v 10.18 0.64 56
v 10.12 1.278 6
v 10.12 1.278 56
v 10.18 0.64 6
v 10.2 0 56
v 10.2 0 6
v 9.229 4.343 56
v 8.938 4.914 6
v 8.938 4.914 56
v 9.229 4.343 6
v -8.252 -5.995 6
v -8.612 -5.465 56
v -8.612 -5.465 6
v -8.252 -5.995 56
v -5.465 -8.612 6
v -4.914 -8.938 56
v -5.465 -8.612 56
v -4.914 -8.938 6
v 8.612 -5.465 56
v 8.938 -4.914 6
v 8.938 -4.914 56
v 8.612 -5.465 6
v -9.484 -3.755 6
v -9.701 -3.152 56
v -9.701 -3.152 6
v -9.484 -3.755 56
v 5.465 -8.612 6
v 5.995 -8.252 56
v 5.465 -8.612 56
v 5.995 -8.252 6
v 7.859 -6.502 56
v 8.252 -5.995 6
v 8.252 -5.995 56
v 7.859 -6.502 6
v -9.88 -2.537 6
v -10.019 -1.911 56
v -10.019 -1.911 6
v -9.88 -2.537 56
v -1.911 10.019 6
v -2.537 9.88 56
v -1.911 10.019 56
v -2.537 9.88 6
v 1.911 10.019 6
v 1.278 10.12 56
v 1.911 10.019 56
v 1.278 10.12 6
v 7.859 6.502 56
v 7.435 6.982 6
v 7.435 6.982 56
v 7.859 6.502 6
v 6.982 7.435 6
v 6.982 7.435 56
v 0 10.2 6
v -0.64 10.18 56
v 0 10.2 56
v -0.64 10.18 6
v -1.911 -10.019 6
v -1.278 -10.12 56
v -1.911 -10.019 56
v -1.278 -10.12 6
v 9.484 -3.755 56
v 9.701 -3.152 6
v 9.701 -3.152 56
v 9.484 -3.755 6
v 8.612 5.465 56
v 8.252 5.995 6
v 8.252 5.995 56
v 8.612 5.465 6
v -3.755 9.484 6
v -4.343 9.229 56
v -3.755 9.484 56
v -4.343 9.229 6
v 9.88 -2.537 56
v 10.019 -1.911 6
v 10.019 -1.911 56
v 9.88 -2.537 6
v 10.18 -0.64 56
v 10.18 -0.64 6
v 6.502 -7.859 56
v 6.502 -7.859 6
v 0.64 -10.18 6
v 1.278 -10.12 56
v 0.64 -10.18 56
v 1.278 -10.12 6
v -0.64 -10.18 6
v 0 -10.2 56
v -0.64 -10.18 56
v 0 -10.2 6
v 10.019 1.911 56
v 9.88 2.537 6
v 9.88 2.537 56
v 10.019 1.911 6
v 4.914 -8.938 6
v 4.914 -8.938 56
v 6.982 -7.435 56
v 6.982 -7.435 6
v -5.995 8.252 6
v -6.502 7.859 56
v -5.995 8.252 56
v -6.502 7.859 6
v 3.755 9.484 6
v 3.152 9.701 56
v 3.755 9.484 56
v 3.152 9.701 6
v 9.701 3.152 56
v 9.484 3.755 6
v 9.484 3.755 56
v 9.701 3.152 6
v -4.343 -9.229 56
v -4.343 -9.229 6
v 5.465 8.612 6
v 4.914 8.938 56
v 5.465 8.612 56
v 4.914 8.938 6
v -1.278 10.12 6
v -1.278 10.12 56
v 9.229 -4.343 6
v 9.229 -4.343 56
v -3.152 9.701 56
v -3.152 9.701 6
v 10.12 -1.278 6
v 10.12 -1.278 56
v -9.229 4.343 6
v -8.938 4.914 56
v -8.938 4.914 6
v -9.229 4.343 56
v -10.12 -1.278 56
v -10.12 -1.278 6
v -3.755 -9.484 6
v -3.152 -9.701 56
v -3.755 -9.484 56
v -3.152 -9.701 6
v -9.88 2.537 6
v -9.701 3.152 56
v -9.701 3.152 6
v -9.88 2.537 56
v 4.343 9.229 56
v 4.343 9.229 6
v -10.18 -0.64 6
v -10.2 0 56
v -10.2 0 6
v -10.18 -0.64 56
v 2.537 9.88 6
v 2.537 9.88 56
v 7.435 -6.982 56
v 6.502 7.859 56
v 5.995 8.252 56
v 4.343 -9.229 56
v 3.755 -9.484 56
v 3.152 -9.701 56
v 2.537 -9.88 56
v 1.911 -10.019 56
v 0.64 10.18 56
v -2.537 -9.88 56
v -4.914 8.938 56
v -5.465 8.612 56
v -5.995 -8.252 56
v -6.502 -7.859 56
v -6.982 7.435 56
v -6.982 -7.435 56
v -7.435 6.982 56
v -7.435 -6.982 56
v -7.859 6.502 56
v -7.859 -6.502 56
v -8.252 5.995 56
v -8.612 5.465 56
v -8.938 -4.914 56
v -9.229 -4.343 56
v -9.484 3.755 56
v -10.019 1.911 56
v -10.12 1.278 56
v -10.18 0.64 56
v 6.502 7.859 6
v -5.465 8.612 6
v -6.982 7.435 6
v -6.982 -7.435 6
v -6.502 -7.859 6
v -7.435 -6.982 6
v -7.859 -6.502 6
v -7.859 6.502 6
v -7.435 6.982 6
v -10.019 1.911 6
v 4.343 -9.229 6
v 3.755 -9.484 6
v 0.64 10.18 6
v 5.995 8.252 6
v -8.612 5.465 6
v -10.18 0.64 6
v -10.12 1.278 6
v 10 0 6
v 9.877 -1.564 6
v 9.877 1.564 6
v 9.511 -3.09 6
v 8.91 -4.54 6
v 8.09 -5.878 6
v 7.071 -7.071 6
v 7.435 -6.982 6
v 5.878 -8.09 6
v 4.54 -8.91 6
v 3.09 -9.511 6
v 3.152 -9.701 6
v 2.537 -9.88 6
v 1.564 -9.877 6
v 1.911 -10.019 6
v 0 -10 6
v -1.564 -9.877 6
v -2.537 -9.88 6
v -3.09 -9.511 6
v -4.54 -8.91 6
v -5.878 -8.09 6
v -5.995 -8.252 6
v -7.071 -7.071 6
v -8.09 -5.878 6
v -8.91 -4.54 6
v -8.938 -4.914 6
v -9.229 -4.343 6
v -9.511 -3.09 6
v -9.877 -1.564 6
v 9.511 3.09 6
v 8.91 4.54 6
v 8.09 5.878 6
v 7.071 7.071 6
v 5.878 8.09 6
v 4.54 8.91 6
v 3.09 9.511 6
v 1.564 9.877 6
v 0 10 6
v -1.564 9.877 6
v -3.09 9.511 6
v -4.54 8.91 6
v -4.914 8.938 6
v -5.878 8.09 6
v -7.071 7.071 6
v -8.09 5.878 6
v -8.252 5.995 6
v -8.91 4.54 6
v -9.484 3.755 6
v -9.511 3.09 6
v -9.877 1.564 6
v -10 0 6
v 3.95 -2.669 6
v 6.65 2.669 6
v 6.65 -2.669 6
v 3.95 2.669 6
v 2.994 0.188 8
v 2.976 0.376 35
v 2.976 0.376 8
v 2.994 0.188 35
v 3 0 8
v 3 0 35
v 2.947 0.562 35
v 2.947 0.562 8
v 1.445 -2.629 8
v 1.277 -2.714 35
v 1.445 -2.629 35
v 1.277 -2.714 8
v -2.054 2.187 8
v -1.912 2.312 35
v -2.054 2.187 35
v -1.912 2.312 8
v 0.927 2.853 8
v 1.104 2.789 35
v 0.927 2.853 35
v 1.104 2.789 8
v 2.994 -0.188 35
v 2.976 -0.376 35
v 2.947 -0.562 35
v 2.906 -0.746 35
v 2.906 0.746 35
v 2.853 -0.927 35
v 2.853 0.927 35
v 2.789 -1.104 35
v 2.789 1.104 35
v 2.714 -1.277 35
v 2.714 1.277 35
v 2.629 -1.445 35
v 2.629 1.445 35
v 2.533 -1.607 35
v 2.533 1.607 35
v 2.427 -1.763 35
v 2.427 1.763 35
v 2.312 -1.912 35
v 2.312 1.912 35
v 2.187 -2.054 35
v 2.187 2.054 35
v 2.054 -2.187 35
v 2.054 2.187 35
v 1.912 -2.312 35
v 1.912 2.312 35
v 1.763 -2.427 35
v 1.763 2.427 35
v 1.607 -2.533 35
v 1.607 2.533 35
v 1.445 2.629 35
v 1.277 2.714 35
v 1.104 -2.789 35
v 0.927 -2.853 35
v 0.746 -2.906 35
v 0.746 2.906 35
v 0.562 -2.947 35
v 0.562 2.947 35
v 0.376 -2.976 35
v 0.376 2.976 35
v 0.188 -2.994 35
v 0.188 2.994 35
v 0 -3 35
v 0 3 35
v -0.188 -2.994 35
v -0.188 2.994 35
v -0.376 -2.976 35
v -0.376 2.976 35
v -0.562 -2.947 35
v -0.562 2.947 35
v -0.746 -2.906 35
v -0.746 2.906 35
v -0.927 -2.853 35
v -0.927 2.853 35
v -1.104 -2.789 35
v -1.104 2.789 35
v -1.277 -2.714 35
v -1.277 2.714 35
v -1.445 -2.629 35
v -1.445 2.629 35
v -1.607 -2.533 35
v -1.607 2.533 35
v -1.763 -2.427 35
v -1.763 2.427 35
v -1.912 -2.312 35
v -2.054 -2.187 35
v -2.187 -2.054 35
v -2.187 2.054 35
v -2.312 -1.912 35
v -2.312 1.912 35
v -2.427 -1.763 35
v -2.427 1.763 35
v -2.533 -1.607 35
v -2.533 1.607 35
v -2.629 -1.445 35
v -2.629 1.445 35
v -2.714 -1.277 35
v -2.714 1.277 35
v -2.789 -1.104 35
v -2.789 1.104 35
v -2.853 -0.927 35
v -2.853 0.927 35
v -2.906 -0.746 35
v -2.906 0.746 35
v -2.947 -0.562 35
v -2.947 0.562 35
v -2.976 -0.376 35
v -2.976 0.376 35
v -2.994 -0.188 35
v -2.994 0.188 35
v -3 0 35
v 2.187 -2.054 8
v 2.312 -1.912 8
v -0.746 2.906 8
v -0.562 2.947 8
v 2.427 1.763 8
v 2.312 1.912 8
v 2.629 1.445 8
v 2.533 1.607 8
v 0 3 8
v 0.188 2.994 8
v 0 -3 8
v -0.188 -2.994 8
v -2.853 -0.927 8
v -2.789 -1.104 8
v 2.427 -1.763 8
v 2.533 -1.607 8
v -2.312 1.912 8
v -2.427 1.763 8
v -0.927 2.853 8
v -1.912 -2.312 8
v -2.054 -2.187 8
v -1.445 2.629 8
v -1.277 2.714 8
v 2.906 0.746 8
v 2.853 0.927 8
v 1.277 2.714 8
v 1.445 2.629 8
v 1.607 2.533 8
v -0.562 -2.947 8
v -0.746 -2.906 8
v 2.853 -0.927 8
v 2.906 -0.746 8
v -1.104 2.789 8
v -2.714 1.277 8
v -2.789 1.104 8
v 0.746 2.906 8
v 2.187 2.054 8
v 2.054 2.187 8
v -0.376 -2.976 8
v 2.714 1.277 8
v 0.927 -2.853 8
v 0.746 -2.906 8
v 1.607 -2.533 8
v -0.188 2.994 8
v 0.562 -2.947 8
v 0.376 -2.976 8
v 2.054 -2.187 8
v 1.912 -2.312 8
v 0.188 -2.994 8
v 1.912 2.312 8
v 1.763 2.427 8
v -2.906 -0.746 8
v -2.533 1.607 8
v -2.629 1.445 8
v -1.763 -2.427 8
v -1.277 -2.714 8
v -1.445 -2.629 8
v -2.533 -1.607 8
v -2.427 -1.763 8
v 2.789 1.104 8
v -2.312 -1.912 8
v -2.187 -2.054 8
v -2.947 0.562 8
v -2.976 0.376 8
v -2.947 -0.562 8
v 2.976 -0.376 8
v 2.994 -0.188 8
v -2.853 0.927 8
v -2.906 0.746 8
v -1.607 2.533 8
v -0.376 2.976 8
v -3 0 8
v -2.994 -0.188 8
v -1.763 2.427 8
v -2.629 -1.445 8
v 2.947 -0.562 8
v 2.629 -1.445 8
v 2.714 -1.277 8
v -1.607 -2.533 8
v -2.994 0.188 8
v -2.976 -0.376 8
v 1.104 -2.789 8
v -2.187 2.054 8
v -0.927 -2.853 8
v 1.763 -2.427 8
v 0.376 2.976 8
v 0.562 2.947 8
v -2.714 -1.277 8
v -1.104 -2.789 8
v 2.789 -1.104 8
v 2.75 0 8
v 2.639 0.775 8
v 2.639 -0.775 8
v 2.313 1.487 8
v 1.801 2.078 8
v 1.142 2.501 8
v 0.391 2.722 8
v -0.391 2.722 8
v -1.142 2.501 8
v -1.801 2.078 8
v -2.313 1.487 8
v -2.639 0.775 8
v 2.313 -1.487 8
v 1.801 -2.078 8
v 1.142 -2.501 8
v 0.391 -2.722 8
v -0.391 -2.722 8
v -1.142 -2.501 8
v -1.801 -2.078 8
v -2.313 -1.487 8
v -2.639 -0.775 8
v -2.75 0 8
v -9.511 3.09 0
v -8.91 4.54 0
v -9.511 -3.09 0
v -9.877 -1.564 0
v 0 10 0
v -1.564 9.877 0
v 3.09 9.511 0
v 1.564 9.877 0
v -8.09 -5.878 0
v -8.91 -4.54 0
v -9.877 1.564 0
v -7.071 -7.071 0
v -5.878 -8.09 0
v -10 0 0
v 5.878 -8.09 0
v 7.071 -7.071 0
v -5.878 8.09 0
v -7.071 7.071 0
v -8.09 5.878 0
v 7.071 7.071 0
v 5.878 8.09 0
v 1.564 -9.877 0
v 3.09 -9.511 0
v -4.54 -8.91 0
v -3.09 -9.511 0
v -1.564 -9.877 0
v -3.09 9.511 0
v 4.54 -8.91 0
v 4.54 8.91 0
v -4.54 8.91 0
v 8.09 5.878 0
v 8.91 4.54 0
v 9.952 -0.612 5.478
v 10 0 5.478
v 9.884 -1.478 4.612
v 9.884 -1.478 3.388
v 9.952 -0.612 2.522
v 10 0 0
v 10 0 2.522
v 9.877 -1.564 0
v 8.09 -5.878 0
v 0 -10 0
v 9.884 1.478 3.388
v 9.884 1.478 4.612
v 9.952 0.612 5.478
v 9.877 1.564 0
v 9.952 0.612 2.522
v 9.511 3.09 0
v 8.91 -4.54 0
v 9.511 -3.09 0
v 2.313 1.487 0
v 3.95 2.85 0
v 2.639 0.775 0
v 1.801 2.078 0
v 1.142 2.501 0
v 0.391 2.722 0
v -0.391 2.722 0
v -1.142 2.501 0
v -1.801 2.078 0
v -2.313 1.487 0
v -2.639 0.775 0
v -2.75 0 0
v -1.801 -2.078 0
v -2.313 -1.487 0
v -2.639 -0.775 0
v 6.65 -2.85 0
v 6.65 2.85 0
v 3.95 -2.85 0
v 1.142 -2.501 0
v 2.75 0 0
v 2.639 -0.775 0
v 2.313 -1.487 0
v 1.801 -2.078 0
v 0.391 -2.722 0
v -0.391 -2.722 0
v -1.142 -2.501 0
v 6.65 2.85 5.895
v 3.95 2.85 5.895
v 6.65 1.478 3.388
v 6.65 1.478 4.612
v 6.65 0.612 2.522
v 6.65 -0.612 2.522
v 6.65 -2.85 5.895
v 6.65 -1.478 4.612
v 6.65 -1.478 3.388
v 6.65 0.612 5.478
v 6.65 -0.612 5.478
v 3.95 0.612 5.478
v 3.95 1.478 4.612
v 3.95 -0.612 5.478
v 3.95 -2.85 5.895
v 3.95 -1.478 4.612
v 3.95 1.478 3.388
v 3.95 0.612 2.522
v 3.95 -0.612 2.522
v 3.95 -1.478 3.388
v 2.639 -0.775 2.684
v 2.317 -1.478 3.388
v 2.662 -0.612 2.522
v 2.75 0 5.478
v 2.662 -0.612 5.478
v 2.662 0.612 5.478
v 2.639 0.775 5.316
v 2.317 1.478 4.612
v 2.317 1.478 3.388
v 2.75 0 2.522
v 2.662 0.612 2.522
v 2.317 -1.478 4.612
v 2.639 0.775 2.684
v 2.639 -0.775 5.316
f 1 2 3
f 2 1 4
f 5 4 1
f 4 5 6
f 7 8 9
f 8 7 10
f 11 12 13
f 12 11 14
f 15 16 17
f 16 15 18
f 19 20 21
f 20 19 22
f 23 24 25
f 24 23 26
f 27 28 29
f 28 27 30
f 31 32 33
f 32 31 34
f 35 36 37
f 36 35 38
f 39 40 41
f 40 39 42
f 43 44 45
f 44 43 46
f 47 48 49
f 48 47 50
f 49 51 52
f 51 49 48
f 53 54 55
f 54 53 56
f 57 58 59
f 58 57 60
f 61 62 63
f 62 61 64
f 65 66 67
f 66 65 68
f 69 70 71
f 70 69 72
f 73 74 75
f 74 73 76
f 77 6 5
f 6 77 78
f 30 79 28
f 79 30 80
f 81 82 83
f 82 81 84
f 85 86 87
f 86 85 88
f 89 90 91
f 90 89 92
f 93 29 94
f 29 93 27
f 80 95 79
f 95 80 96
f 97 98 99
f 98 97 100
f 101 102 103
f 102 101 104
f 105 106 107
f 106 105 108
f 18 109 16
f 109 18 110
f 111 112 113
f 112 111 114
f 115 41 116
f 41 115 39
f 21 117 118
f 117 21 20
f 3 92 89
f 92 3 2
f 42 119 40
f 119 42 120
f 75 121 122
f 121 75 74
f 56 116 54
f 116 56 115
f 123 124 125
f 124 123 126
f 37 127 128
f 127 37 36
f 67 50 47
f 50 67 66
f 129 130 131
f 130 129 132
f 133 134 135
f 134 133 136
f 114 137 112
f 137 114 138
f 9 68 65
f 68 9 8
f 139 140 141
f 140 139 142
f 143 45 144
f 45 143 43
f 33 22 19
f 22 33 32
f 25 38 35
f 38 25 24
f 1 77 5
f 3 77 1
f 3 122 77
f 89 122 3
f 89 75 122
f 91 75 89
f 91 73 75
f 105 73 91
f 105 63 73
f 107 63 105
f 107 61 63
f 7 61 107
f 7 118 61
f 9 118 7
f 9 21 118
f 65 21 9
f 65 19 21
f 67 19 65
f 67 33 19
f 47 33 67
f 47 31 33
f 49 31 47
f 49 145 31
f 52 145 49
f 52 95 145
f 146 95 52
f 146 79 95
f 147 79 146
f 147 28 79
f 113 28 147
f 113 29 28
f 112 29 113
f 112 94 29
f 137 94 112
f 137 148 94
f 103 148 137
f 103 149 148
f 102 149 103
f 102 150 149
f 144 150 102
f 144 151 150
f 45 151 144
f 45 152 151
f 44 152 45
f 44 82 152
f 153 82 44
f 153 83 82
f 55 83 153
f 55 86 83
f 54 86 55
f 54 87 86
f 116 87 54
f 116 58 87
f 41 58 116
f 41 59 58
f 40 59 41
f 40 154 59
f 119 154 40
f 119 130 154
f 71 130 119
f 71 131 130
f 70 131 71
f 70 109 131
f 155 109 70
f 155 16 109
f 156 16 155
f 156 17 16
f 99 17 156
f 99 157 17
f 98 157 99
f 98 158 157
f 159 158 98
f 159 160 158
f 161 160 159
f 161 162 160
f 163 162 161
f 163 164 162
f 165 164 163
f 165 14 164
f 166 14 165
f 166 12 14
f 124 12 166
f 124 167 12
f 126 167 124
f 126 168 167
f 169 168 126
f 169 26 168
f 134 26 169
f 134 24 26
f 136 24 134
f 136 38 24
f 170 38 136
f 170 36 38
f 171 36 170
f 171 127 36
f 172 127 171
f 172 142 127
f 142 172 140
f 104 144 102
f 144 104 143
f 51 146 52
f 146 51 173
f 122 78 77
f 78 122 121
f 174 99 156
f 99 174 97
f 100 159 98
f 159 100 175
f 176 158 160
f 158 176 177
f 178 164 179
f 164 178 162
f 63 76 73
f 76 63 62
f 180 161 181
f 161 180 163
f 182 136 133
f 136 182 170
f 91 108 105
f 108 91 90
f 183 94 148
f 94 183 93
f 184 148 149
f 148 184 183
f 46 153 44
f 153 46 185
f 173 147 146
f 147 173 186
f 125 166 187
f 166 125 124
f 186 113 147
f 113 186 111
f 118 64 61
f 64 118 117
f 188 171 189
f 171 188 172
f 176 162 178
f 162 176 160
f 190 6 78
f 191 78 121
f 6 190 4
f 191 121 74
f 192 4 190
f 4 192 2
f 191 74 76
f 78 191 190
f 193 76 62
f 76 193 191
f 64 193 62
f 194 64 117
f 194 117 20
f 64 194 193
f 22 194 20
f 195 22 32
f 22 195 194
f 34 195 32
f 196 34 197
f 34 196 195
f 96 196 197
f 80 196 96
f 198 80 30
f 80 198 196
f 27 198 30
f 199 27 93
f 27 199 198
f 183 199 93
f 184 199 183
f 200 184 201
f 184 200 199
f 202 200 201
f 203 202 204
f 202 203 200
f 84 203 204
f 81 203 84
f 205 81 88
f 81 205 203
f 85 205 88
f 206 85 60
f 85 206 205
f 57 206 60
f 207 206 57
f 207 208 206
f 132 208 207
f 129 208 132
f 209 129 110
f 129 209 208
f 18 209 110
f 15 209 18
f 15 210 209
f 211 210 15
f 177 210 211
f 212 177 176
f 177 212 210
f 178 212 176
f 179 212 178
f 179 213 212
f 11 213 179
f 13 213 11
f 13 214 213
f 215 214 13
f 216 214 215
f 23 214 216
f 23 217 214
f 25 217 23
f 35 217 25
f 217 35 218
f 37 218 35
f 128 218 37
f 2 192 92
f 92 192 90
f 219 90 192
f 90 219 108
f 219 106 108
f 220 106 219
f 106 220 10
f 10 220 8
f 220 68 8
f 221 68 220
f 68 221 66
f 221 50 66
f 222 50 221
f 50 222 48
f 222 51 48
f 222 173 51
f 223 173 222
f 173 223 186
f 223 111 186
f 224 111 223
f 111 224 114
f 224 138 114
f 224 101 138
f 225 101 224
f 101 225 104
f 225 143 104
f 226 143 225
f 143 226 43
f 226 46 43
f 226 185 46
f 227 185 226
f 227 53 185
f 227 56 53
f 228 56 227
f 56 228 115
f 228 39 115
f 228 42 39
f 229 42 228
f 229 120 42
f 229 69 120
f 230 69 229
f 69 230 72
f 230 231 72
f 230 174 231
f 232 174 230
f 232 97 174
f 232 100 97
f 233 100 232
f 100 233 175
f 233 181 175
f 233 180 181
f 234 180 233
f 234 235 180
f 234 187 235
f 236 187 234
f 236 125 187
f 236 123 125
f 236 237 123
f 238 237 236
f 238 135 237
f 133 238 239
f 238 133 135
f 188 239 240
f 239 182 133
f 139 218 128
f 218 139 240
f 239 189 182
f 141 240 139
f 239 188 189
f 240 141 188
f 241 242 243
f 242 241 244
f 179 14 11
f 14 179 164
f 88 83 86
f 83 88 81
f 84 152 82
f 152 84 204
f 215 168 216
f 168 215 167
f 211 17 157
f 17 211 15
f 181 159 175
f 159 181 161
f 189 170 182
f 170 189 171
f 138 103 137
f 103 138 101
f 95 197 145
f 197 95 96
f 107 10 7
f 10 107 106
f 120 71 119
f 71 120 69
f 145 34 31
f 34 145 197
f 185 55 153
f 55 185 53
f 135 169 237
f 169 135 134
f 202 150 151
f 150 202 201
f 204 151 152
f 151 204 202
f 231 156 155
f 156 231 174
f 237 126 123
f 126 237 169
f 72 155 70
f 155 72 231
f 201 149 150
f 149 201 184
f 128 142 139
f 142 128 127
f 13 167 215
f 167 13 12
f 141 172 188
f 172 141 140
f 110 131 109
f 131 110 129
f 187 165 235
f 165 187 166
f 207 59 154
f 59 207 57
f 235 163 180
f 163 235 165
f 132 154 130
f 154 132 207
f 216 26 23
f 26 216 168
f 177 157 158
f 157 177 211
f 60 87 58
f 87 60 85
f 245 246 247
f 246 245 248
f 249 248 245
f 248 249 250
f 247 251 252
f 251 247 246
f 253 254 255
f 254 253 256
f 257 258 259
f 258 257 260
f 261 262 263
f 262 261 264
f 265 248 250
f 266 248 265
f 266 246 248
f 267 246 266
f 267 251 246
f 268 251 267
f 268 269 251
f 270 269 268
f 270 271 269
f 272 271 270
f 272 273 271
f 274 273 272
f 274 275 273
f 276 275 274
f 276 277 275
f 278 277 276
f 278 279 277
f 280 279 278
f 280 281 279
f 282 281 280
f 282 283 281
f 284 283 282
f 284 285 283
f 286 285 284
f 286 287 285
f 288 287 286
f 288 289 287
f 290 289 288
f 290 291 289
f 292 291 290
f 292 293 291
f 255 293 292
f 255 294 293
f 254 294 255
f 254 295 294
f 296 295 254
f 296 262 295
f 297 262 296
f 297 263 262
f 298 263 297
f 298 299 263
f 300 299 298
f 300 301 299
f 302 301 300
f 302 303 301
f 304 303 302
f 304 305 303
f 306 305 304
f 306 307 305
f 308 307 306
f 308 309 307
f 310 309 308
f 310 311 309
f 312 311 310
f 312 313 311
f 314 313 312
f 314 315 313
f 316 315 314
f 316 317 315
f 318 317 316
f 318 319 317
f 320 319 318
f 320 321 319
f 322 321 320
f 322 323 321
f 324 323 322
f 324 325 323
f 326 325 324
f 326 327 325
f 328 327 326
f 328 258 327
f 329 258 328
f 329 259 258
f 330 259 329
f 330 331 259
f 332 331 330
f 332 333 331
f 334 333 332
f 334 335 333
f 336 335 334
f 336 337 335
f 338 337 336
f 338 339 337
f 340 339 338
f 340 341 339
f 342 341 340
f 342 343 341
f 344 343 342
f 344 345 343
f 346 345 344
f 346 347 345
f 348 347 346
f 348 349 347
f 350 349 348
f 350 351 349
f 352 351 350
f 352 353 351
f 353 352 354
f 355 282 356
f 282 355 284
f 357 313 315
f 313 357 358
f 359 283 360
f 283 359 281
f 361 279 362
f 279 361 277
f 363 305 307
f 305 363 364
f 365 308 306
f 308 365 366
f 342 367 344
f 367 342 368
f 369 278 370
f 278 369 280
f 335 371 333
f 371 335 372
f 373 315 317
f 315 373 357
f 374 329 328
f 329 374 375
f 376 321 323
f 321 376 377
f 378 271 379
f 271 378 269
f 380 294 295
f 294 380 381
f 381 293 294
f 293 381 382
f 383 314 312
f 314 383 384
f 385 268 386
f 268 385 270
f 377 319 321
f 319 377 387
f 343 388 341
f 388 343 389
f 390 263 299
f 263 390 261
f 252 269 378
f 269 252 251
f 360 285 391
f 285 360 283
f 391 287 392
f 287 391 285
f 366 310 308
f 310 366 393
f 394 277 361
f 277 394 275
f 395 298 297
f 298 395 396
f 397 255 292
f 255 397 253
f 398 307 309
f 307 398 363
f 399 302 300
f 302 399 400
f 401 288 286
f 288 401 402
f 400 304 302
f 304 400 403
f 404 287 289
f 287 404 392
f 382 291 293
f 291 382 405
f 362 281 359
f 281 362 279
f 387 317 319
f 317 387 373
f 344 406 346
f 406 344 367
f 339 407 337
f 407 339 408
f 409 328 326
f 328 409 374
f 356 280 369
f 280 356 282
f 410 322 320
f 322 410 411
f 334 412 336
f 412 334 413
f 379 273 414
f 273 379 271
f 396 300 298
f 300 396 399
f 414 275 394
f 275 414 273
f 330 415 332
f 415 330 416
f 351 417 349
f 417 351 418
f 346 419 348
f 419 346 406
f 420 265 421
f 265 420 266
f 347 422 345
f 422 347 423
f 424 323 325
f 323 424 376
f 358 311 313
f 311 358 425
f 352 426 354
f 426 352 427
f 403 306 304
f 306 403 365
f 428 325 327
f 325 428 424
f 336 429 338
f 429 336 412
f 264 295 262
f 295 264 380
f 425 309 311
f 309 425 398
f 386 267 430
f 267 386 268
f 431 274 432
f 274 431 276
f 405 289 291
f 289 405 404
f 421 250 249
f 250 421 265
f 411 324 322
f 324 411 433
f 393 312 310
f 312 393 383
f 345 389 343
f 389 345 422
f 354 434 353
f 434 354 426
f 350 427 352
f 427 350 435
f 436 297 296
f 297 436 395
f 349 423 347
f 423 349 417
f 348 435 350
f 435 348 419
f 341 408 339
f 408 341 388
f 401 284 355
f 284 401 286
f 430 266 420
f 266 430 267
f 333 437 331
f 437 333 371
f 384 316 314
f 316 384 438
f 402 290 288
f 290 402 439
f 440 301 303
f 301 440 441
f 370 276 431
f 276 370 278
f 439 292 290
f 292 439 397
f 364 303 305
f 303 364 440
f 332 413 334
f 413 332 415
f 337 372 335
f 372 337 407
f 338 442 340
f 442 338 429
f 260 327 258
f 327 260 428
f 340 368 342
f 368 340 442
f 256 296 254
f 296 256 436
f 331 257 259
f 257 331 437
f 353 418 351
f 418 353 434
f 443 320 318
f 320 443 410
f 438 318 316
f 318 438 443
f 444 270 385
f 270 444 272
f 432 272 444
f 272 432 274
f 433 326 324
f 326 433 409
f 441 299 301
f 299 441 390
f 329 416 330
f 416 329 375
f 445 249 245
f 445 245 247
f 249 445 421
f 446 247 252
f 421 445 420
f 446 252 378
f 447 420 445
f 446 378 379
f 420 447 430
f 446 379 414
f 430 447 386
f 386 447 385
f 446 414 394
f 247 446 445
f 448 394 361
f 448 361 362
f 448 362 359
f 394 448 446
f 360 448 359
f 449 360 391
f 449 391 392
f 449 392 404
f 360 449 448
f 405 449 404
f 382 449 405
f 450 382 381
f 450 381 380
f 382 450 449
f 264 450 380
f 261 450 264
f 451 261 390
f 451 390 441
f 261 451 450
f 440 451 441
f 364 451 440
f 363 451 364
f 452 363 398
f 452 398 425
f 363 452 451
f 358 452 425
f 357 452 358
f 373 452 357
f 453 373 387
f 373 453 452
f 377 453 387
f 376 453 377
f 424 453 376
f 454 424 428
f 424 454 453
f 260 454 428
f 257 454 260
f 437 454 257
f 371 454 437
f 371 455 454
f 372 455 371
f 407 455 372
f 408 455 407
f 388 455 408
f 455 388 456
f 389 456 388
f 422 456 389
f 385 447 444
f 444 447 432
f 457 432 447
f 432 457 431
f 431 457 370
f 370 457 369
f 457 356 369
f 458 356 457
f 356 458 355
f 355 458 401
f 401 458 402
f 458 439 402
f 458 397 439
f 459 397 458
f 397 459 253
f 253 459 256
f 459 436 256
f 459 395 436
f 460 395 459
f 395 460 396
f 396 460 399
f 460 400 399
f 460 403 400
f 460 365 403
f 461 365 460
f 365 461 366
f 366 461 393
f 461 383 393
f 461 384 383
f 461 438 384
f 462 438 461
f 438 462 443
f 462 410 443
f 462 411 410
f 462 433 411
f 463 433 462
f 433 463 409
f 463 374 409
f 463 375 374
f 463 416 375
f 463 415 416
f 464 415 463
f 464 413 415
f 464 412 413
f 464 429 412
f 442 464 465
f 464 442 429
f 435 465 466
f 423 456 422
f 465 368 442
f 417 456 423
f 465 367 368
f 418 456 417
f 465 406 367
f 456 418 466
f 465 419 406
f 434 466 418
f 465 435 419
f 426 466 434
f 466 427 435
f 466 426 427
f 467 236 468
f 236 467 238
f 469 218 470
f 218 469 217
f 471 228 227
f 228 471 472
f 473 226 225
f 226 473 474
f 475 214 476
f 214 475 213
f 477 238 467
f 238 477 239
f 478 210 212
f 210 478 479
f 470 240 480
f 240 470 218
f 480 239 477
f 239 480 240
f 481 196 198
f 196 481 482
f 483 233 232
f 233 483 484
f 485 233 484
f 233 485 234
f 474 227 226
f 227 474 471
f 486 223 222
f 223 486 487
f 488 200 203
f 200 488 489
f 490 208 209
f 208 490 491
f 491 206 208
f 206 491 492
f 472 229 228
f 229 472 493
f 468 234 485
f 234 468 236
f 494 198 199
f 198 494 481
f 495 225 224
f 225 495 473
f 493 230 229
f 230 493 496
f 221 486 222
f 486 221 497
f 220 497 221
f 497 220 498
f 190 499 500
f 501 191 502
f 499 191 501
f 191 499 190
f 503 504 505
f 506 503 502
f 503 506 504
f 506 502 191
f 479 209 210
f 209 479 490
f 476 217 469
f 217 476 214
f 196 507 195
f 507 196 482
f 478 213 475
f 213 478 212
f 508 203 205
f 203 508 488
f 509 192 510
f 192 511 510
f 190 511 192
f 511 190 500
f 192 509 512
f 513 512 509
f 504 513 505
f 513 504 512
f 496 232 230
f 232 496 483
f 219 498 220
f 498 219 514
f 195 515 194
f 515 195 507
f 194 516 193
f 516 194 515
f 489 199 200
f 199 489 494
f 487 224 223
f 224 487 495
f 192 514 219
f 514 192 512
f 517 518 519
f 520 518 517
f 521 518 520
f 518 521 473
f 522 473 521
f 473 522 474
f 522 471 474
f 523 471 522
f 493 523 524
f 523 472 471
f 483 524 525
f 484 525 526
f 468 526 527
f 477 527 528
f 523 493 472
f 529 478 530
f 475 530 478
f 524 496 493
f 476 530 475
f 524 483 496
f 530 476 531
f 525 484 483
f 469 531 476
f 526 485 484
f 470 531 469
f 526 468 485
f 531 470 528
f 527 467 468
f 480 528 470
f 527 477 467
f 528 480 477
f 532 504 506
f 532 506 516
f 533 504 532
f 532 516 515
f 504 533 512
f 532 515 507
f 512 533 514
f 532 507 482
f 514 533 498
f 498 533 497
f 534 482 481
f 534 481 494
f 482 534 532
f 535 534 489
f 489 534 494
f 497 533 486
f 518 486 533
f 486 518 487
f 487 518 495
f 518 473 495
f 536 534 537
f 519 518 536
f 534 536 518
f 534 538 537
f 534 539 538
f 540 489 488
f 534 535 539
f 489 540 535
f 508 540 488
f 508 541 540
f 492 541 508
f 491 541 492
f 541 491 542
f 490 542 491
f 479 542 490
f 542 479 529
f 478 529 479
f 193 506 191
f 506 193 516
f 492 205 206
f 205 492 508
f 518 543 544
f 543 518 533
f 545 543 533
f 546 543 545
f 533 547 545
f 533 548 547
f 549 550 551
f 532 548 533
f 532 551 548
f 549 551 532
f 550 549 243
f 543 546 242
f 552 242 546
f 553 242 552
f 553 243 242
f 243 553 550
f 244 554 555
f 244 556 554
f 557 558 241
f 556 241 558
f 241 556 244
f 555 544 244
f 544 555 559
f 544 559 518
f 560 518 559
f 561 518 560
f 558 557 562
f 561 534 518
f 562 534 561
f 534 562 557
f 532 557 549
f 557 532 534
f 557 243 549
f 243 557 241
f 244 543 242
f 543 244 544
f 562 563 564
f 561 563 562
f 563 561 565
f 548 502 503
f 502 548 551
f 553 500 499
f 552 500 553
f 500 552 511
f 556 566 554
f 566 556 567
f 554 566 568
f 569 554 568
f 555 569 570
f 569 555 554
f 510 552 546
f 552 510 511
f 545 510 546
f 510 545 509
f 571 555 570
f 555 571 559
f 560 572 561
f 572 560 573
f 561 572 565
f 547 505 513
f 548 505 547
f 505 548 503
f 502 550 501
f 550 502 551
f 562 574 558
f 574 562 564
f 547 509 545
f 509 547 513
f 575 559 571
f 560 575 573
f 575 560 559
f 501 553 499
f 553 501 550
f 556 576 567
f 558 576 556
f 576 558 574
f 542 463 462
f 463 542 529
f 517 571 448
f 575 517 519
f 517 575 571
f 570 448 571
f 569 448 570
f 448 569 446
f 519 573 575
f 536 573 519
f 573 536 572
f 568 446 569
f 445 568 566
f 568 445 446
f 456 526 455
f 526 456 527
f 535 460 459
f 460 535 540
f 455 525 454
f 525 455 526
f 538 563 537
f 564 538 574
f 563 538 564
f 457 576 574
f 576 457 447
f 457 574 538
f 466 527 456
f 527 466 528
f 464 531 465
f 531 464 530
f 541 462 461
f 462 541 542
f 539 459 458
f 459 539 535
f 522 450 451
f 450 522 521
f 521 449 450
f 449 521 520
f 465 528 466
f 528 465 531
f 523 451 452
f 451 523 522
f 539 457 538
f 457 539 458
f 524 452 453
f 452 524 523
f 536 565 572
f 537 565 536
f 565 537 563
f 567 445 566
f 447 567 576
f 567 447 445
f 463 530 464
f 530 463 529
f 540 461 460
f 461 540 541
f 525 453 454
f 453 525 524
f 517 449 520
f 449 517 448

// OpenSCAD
// Parametric Pulley with multiple belt profiles
// by droftarts January 2012

// Based on pulleys by:
// http://www.thingiverse.com/thing:11256 by me!
// https://github.com/prusajr/PrusaMendel by Josef Prusa
// http://www.thingiverse.com/thing:3104 by GilesBathgate
// http://www.thingiverse.com/thing:2079 by nophead

// dxf tooth data from http://oem.cadregister.com/asp/PPOW_Entry.asp?company=915217&elementID=07807803/METRIC/URETH/WV0025/F
// pulley diameter checked and modelled from data at http://www.sdp-si.com/D265/HTML/D265T016.html

/**
 * @name Pulley
 * @category Printed
 * @using 1 x m3 nut, normal or nyloc
 * @using 1 x m3x10 set screw or 1 x m3x8 grub screw
 */


// tuneable constants

teeth = 8;			// Number of teeth, standard Mendel T5 belt = 8, gives Outside Diameter of 11.88mm
profile = 1;		// 1=MXL 2=40DP 3=XL 4=H 5=T2.5 6=T5 7=T10 8=AT5 9=HTD_3mm 10=HTD_5mm 11=HTD_8mm 12=GT2_2mm 13=GT2_3mm 14=GT2_5mm

motor_shaft = 5.5;	// NEMA17 motor shaft exact diameter = 5
m3_dia = 3.2;		// 3mm hole diameter
m3_nut_hex = 1;		// 1 for hex, 0 for square nut
m3_nut_flats = 5.7;	// normal M3 hex nut exact width = 5.5
m3_nut_depth = 2.7;	// normal M3 hex nut exact depth = 2.4, nyloc = 4

retainer = 0;		// Belt retainer above teeth, 0 = No, 1 = Yes
retainer_ht = 1.5;	// height of retainer flange over pulley, standard = 1.5
idler = 0;			// Belt retainer below teeth, 0 = No, 1 = Yes
idler_ht = 1.5;		// height of idler flange over pulley, standard = 1.5

pulley_t_ht = 12;	// length of toothed part of pulley, standard = 12
pulley_b_ht = 8;		// pulley base height, standard = 8. Set to same as idler_ht if you want an idler but no pulley.
pulley_b_dia = 20;	// pulley base diameter, standard = 20
no_of_nuts = 1;		// number of captive nuts required, standard = 1
nut_angle = 90;		// angle between nuts, standard = 90
nut_shaft_distance = 1.2;	// distance between inner face of nut and shaft, can be negative.


//	********************************
//	** Scaling tooth for good fit **
//	********************************
/*	To improve fit of belt to pulley, set the following constant. Decrease or increase by 0.1mm at a time. We are modelling the *BELT* tooth here, not the tooth on the pulley. Increasing the number will *decrease* the pulley tooth size. Increasing the tooth width will also scale proportionately the tooth depth, to maintain the shape of the tooth, and increase how far into the pulley the tooth is indented. Can be negative */

additional_tooth_width = 0.2; //mm

//	If you need more tooth depth than this provides, adjust the following constant. However, this will cause the shape of the tooth to change.

additional_tooth_depth = 0; //mm

// calculated constants

nut_elevation = pulley_b_ht/2;
m3_nut_points = 2*((m3_nut_flats/2)/cos(30)); // This is needed for the nut trap

// The following set the pulley diameter for a given number of teeth

MXL_pulley_dia = tooth_spacing (2.032,0.254);
40DP_pulley_dia = tooth_spacing (2.07264,0.1778);
XL_pulley_dia = tooth_spacing (5.08,0.254);
H_pulley_dia = tooth_spacing (9.525,0.381);
T2_5_pulley_dia = tooth_spaceing_curvefit (0.7467,0.796,1.026);
T5_pulley_dia = tooth_spaceing_curvefit (0.6523,1.591,1.064);
T10_pulley_dia = tooth_spacing (10,0.93);
AT5_pulley_dia = tooth_spaceing_curvefit (0.6523,1.591,1.064);
HTD_3mm_pulley_dia = tooth_spacing (3,0.381);
HTD_5mm_pulley_dia = tooth_spacing (5,0.5715);
HTD_8mm_pulley_dia = tooth_spacing (8,0.6858);
GT2_2mm_pulley_dia = tooth_spacing (2,0.254);
GT2_3mm_pulley_dia = tooth_spacing (3,0.381);
GT2_5mm_pulley_dia = tooth_spacing (5,0.5715);

// The following calls the pulley creation part, and passes the pulley diameter and tooth width to that module

if ( profile == 1 ) { pulley ( "MXL" , MXL_pulley_dia , 0.508 , 1.321 ); }
if ( profile == 2 ) { pulley ( "40 D.P." , 40DP_pulley_dia , 0.457 , 1.226 ); }
if ( profile == 3 ) { pulley ( "XL" , XL_pulley_dia , 1.27, 3.051 ); }
if ( profile == 4 ) { pulley ( "H" , H_pulley_dia ,1.905 , 5.359 ); }
if ( profile == 5 ) { pulley ( "T2.5" , T2_5_pulley_dia , 0.7 , 1.678 ); }
if ( profile == 6 ) { pulley ( "T5" , T5_pulley_dia , 1.19 , 3.264 ); }
if ( profile == 7 ) { pulley ( "T10" , T10_pulley_dia , 2.5 , 6.13 ); }
if ( profile == 8 ) { pulley ( "AT5" , AT5_pulley_dia , 1.19 , 4.268 ); }
if ( profile == 9 ) { pulley ( "HTD 3mm" , HTD_3mm_pulley_dia , 1.289 , 2.27 ); }
if ( profile == 10 ) { pulley ( "HTD 5mm" , HTD_5mm_pulley_dia , 2.199 , 3.781 ); }
if ( profile == 11 ) { pulley ( "HTD 8mm" , HTD_8mm_pulley_dia , 3.607 , 6.603 ); }
if ( profile == 12 ) { pulley ( "GT2 2mm" , GT2_2mm_pulley_dia , 0.764 , 1.494 ); }
if ( profile == 13 ) { pulley ( "GT2 3mm" , GT2_3mm_pulley_dia , 1.169 , 2.31 ); }
if ( profile == 14 ) { pulley ( "GT2 5mm" , GT2_5mm_pulley_dia , 1.969 , 3.952 ); }

// Functions

function tooth_spaceing_curvefit (b,c,d)
	= ((c * pow(teeth,d)) / (b + pow(teeth,d))) * teeth ;

function tooth_spacing(tooth_pitch,pitch_line_offset)
	= (2*((teeth*tooth_pitch)/(3.14159265*2)-pitch_line_offset)) ;

// Main Module

$fn = 100;

module pulley( belt_type , pulley_OD , tooth_depth , tooth_width )
	{
	echo (str("Belt type = ",belt_type,"; Number of teeth = ",teeth,"; Pulley Outside Diameter = ",pulley_OD,"mm "));
	tooth_distance_from_centre = sqrt( pow(pulley_OD/2,2) - pow((tooth_width+additional_tooth_width)/2,2));
	tooth_width_scale = (tooth_width + additional_tooth_width ) / tooth_width;
	tooth_depth_scale = ((tooth_depth + additional_tooth_depth ) / tooth_depth) ;


//	************************************************************************
//	*** uncomment the following line if pulley is wider than puller base ***
//	************************************************************************

//	translate ([0,0, pulley_b_ht + pulley_t_ht + retainer_ht ]) rotate ([0,180,0])
    
        difference() {
    translate([0, 0, 31])    
    cylinder(h = 50, r=10.2, center = true);
            
                translate([0, 0, 15])    
    cylinder(h = 40, r=3, center = true);
        }

	difference()
	 {	 
		union()
		{
			//base
	
			if ( pulley_b_ht < 2 ) { echo ("CAN'T DRAW PULLEY BASE, HEIGHT LESS THAN 2!!!"); } else {
				rotate_extrude($fn=pulley_b_dia*2)
				{
						square([pulley_b_dia/2-1,pulley_b_ht]);
						square([pulley_b_dia/2,pulley_b_ht-1]);
						translate([pulley_b_dia/2-1,pulley_b_ht-1]) circle(1);
				}
			}
            
	
		difference()
			{
			//shaft - diameter is outside diameter of pulley
			
			translate([0,0,pulley_b_ht]) 
			rotate ([0,0,360/(teeth*4)]) 
			cylinder(r=pulley_OD/2,h=pulley_t_ht, $fn=teeth*4);
	
			//teeth - cut out of shaft
		
			for(i=[1:teeth]) 
			rotate([0,0,i*(360/teeth)])
			translate([0,-tooth_distance_from_centre,pulley_b_ht -1]) 
			scale ([ tooth_width_scale , tooth_depth_scale , 1 ]) 
			{
			if ( profile == 1 ) { MXL();}
			if ( profile == 2 ) { 40DP();}
			if ( profile == 3 ) { XL();}
			if ( profile == 4 ) { H();}
			if ( profile == 5 ) { T2_5();}
			if ( profile == 6 ) { T5();}
			if ( profile == 7 ) { T10();}
			if ( profile == 8 ) { AT5();}
			if ( profile == 9 ) { HTD_3mm();}
			if ( profile == 10 ) { HTD_5mm();}
			if ( profile == 11 ) { HTD_8mm();}
			if ( profile == 12 ) { GT2_2mm();}
			if ( profile == 13 ) { GT2_3mm();}
			if ( profile == 14 ) { GT2_5mm();}
			}

			}
			
		//belt retainer / idler
		if ( retainer > 0 ) {translate ([0,0, pulley_b_ht + pulley_t_ht ]) 
		rotate_extrude($fn=teeth*4)  
		polygon([[0,0],[pulley_OD/2,0],[pulley_OD/2 + retainer_ht , retainer_ht],[0 , retainer_ht],[0,0]]);}
		
		if ( idler > 0 ) {translate ([0,0, pulley_b_ht - idler_ht ]) 
		rotate_extrude($fn=teeth*4)  
		polygon([[0,0],[pulley_OD/2 + idler_ht,0],[pulley_OD/2 , idler_ht],[0 , idler_ht],[0,0]]);}
	
		}
	   
		//hole for motor shaft
		translate([0,0,-1])cylinder(r=motor_shaft/2,h=pulley_b_ht + pulley_t_ht + retainer_ht + 2,$fn=motor_shaft*4);
				
		//captive nut and grub screw holes
	
		if ( pulley_b_ht < m3_nut_flats ) { echo ("CAN'T DRAW CAPTIVE NUTS, HEIGHT LESS THAN NUT DIAMETER!!!"); } else {
		if ( (pulley_b_dia - motor_shaft)/2 < m3_nut_depth + 3 ) { echo ("CAN'T DRAW CAPTIVE NUTS, DIAMETER TOO SMALL FOR NUT DEPTH!!!"); } else {
	
			for(j=[1:no_of_nuts]) rotate([0,0,j*nut_angle])
			translate([0,0,nut_elevation])rotate([90,0,0])
	
			union()
			{
				//entrance
				translate([0,-pulley_b_ht/4-0.5,motor_shaft/2+m3_nut_depth/2+nut_shaft_distance]) cube([m3_nut_flats,pulley_b_ht/2+1,m3_nut_depth],center=true);
	
				//nut
				if ( m3_nut_hex > 0 )
					{
						// hex nut
						translate([0,0.25,motor_shaft/2+m3_nut_depth/2+nut_shaft_distance]) rotate([0,0,30]) cylinder(r=m3_nut_points/2,h=m3_nut_depth,center=true,$fn=6);
					} else {
						// square nut
						translate([0,0.25,motor_shaft/2+m3_nut_depth/2+nut_shaft_distance]) cube([m3_nut_flats,m3_nut_flats,m3_nut_depth],center=true);
					}
	
				//grub screw hole
				rotate([0,0,22.5])cylinder(r=m3_dia/2,h=pulley_b_dia/2+1,$fn=8);
			}
		}}
	 }
	   
	}


// Tooth profile modules

module MXL()
	{
	linear_extrude(height=pulley_t_ht+2) polygon([[-0.660421,-0.5],[-0.660421,0],[-0.621898,0.006033],[-0.587714,0.023037],[-0.560056,0.049424],[-0.541182,0.083609],[-0.417357,0.424392],[-0.398413,0.458752],[-0.370649,0.48514],[-0.336324,0.502074],[-0.297744,0.508035],[0.297744,0.508035],[0.336268,0.502074],[0.370452,0.48514],[0.39811,0.458752],[0.416983,0.424392],[0.540808,0.083609],[0.559752,0.049424],[0.587516,0.023037],[0.621841,0.006033],[0.660421,0],[0.660421,-0.5]]);
	}

module 40DP()
	{
	linear_extrude(height=pulley_t_ht+2) polygon([[-0.612775,-0.5],[-0.612775,0],[-0.574719,0.010187],[-0.546453,0.0381],[-0.355953,0.3683],[-0.327604,0.405408],[-0.291086,0.433388],[-0.248548,0.451049],[-0.202142,0.4572],[0.202494,0.4572],[0.248653,0.451049],[0.291042,0.433388],[0.327609,0.405408],[0.356306,0.3683],[0.546806,0.0381],[0.574499,0.010187],[0.612775,0],[0.612775,-0.5]]);
	}

module XL()
	{
	linear_extrude(height=pulley_t_ht+2) polygon([[-1.525411,-1],[-1.525411,0],[-1.41777,0.015495],[-1.320712,0.059664],[-1.239661,0.129034],[-1.180042,0.220133],[-0.793044,1.050219],[-0.733574,1.141021],[-0.652507,1.210425],[-0.555366,1.254759],[-0.447675,1.270353],[0.447675,1.270353],[0.555366,1.254759],[0.652507,1.210425],[0.733574,1.141021],[0.793044,1.050219],[1.180042,0.220133],[1.239711,0.129034],[1.320844,0.059664],[1.417919,0.015495],[1.525411,0],[1.525411,-1]]);
	}

module H()
	{
	linear_extrude(height=pulley_t_ht+2) polygon([[-2.6797,-1],[-2.6797,0],[-2.600907,0.006138],[-2.525342,0.024024],[-2.45412,0.052881],[-2.388351,0.091909],[-2.329145,0.140328],[-2.277614,0.197358],[-2.234875,0.262205],[-2.202032,0.334091],[-1.75224,1.57093],[-1.719538,1.642815],[-1.676883,1.707663],[-1.62542,1.764693],[-1.566256,1.813112],[-1.500512,1.85214],[-1.4293,1.880997],[-1.353742,1.898883],[-1.274949,1.905021],[1.275281,1.905021],[1.354056,1.898883],[1.429576,1.880997],[1.500731,1.85214],[1.566411,1.813112],[1.625508,1.764693],[1.676919,1.707663],[1.719531,1.642815],[1.752233,1.57093],[2.20273,0.334091],[2.235433,0.262205],[2.278045,0.197358],[2.329455,0.140328],[2.388553,0.091909],[2.454233,0.052881],[2.525384,0.024024],[2.600904,0.006138],[2.6797,0],[2.6797,-1]]);
	}

module T2_5()
	{
	linear_extrude(height=pulley_t_ht+2) polygon([[-0.839258,-0.5],[-0.839258,0],[-0.770246,0.021652],[-0.726369,0.079022],[-0.529167,0.620889],[-0.485025,0.67826],[-0.416278,0.699911],[0.416278,0.699911],[0.484849,0.67826],[0.528814,0.620889],[0.726369,0.079022],[0.770114,0.021652],[0.839258,0],[0.839258,-0.5]]);
	}

module T5()
	{
	linear_extrude(height=pulley_t_ht+2) polygon([[-1.632126,-0.5],[-1.632126,0],[-1.568549,0.004939],[-1.507539,0.019367],[-1.450023,0.042686],[-1.396912,0.074224],[-1.349125,0.113379],[-1.307581,0.159508],[-1.273186,0.211991],[-1.246868,0.270192],[-1.009802,0.920362],[-0.983414,0.978433],[-0.949018,1.030788],[-0.907524,1.076798],[-0.859829,1.115847],[-0.80682,1.147314],[-0.749402,1.170562],[-0.688471,1.184956],[-0.624921,1.189895],[0.624971,1.189895],[0.688622,1.184956],[0.749607,1.170562],[0.807043,1.147314],[0.860055,1.115847],[0.907754,1.076798],[0.949269,1.030788],[0.9837,0.978433],[1.010193,0.920362],[1.246907,0.270192],[1.273295,0.211991],[1.307726,0.159508],[1.349276,0.113379],[1.397039,0.074224],[1.450111,0.042686],[1.507589,0.019367],[1.568563,0.004939],[1.632126,0],[1.632126,-0.5]]);
	}

module T10()
	{
	linear_extrude(height=pulley_t_ht+2) polygon([[-3.06511,-1],[-3.06511,0],[-2.971998,0.007239],[-2.882718,0.028344],[-2.79859,0.062396],[-2.720931,0.108479],[-2.651061,0.165675],[-2.590298,0.233065],[-2.539962,0.309732],[-2.501371,0.394759],[-1.879071,2.105025],[-1.840363,2.190052],[-1.789939,2.266719],[-1.729114,2.334109],[-1.659202,2.391304],[-1.581518,2.437387],[-1.497376,2.47144],[-1.408092,2.492545],[-1.314979,2.499784],[1.314979,2.499784],[1.408091,2.492545],[1.497371,2.47144],[1.581499,2.437387],[1.659158,2.391304],[1.729028,2.334109],[1.789791,2.266719],[1.840127,2.190052],[1.878718,2.105025],[2.501018,0.394759],[2.539726,0.309732],[2.59015,0.233065],[2.650975,0.165675],[2.720887,0.108479],[2.798571,0.062396],[2.882713,0.028344],[2.971997,0.007239],[3.06511,0],[3.06511,-1]]);
	}

module AT5()
	{
	linear_extrude(height=pulley_t_ht+2) polygon([[-2.134129,-0.75],[-2.134129,0],[-2.058023,0.005488],[-1.984595,0.021547],[-1.914806,0.047569],[-1.849614,0.082947],[-1.789978,0.127073],[-1.736857,0.179338],[-1.691211,0.239136],[-1.653999,0.305859],[-1.349199,0.959203],[-1.286933,1.054635],[-1.201914,1.127346],[-1.099961,1.173664],[-0.986896,1.18992],[0.986543,1.18992],[1.099614,1.173664],[1.201605,1.127346],[1.286729,1.054635],[1.349199,0.959203],[1.653646,0.305859],[1.690859,0.239136],[1.73651,0.179338],[1.789644,0.127073],[1.849305,0.082947],[1.914539,0.047569],[1.984392,0.021547],[2.057906,0.005488],[2.134129,0],[2.134129,-0.75]]);
	}

module HTD_3mm()
	{
	linear_extrude(height=pulley_t_ht+2) polygon([[-1.135062,-0.5],[-1.135062,0],[-1.048323,0.015484],[-0.974284,0.058517],[-0.919162,0.123974],[-0.889176,0.206728],[-0.81721,0.579614],[-0.800806,0.653232],[-0.778384,0.72416],[-0.750244,0.792137],[-0.716685,0.856903],[-0.678005,0.918199],[-0.634505,0.975764],[-0.586483,1.029338],[-0.534238,1.078662],[-0.47807,1.123476],[-0.418278,1.16352],[-0.355162,1.198533],[-0.289019,1.228257],[-0.22015,1.25243],[-0.148854,1.270793],[-0.07543,1.283087],[-0.000176,1.28905],[0.075081,1.283145],[0.148515,1.270895],[0.219827,1.252561],[0.288716,1.228406],[0.354879,1.19869],[0.418018,1.163675],[0.477831,1.123623],[0.534017,1.078795],[0.586276,1.029452],[0.634307,0.975857],[0.677809,0.91827],[0.716481,0.856953],[0.750022,0.792167],[0.778133,0.724174],[0.800511,0.653236],[0.816857,0.579614],[0.888471,0.206728],[0.919014,0.123974],[0.974328,0.058517],[1.048362,0.015484],[1.135062,0],[1.135062,-0.5]]);
	}

module HTD_5mm()
	{
	linear_extrude(height=pulley_t_ht+2) polygon([[-1.89036,-0.75],[-1.89036,0],[-1.741168,0.02669],[-1.61387,0.100806],[-1.518984,0.21342],[-1.467026,0.3556],[-1.427162,0.960967],[-1.398568,1.089602],[-1.359437,1.213531],[-1.310296,1.332296],[-1.251672,1.445441],[-1.184092,1.552509],[-1.108081,1.653042],[-1.024167,1.746585],[-0.932877,1.832681],[-0.834736,1.910872],[-0.730271,1.980701],[-0.62001,2.041713],[-0.504478,2.09345],[-0.384202,2.135455],[-0.259708,2.167271],[-0.131524,2.188443],[-0.000176,2.198511],[0.131296,2.188504],[0.259588,2.167387],[0.384174,2.135616],[0.504527,2.093648],[0.620123,2.04194],[0.730433,1.980949],[0.834934,1.911132],[0.933097,1.832945],[1.024398,1.746846],[1.108311,1.653291],[1.184308,1.552736],[1.251865,1.445639],[1.310455,1.332457],[1.359552,1.213647],[1.39863,1.089664],[1.427162,0.960967],[1.467026,0.3556],[1.518984,0.21342],[1.61387,0.100806],[1.741168,0.02669],[1.89036,0],[1.89036,-0.75]]);
	}

module HTD_8mm()
	{
	linear_extrude(height=pulley_t_ht+2) polygon([[-3.301471,-1],[-3.301471,0],[-3.16611,0.012093],[-3.038062,0.047068],[-2.919646,0.10297],[-2.813182,0.177844],[-2.720989,0.269734],[-2.645387,0.376684],[-2.588694,0.496739],[-2.553229,0.627944],[-2.460801,1.470025],[-2.411413,1.691917],[-2.343887,1.905691],[-2.259126,2.110563],[-2.158035,2.30575],[-2.041518,2.490467],[-1.910478,2.66393],[-1.76582,2.825356],[-1.608446,2.973961],[-1.439261,3.10896],[-1.259169,3.22957],[-1.069074,3.335006],[-0.869878,3.424485],[-0.662487,3.497224],[-0.447804,3.552437],[-0.226732,3.589341],[-0.000176,3.607153],[0.226511,3.589461],[0.447712,3.552654],[0.66252,3.497516],[0.870027,3.424833],[1.069329,3.33539],[1.259517,3.229973],[1.439687,3.109367],[1.608931,2.974358],[1.766344,2.825731],[1.911018,2.664271],[2.042047,2.490765],[2.158526,2.305998],[2.259547,2.110755],[2.344204,1.905821],[2.411591,1.691983],[2.460801,1.470025],[2.553229,0.627944],[2.588592,0.496739],[2.645238,0.376684],[2.720834,0.269734],[2.81305,0.177844],[2.919553,0.10297],[3.038012,0.047068],[3.166095,0.012093],[3.301471,0],[3.301471,-1]]);
	}

module GT2_2mm()
	{
	linear_extrude(height=pulley_t_ht+2) polygon([[0.747183,-0.5],[0.747183,0],[0.647876,0.037218],[0.598311,0.130528],[0.578556,0.238423],[0.547158,0.343077],[0.504649,0.443762],[0.451556,0.53975],[0.358229,0.636924],[0.2484,0.707276],[0.127259,0.750044],[0,0.76447],[-0.127259,0.750044],[-0.2484,0.707276],[-0.358229,0.636924],[-0.451556,0.53975],[-0.504797,0.443762],[-0.547291,0.343077],[-0.578605,0.238423],[-0.598311,0.130528],[-0.648009,0.037218],[-0.747183,0],[-0.747183,-0.5]]);
	}

module GT2_3mm()
	{
	linear_extrude(height=pulley_t_ht+2) polygon([[-1.155171,-0.5],[-1.155171,0],[-1.065317,0.016448],[-0.989057,0.062001],[-0.93297,0.130969],[-0.90364,0.217664],[-0.863705,0.408181],[-0.800056,0.591388],[-0.713587,0.765004],[-0.60519,0.926747],[-0.469751,1.032548],[-0.320719,1.108119],[-0.162625,1.153462],[0,1.168577],[0.162625,1.153462],[0.320719,1.108119],[0.469751,1.032548],[0.60519,0.926747],[0.713587,0.765004],[0.800056,0.591388],[0.863705,0.408181],[0.90364,0.217664],[0.932921,0.130969],[0.988924,0.062001],[1.065168,0.016448],[1.155171,0],[1.155171,-0.5]]);
	}

module GT2_5mm()
	{
	linear_extrude(height=pulley_t_ht+2) polygon([[-1.975908,-0.75],[-1.975908,0],[-1.797959,0.03212],[-1.646634,0.121224],[-1.534534,0.256431],[-1.474258,0.426861],[-1.446911,0.570808],[-1.411774,0.712722],[-1.368964,0.852287],[-1.318597,0.989189],[-1.260788,1.123115],[-1.195654,1.25375],[-1.12331,1.380781],[-1.043869,1.503892],[-0.935264,1.612278],[-0.817959,1.706414],[-0.693181,1.786237],[-0.562151,1.851687],[-0.426095,1.9027],[-0.286235,1.939214],[-0.143795,1.961168],[0,1.9685],[0.143796,1.961168],[0.286235,1.939214],[0.426095,1.9027],[0.562151,1.851687],[0.693181,1.786237],[0.817959,1.706414],[0.935263,1.612278],[1.043869,1.503892],[1.123207,1.380781],[1.195509,1.25375],[1.26065,1.123115],[1.318507,0.989189],[1.368956,0.852287],[1.411872,0.712722],[1.447132,0.570808],[1.474611,0.426861],[1.534583,0.256431],[1.646678,0.121223],[1.798064,0.03212],[1.975908,0],[1.975908,-0.75]]);
	}
